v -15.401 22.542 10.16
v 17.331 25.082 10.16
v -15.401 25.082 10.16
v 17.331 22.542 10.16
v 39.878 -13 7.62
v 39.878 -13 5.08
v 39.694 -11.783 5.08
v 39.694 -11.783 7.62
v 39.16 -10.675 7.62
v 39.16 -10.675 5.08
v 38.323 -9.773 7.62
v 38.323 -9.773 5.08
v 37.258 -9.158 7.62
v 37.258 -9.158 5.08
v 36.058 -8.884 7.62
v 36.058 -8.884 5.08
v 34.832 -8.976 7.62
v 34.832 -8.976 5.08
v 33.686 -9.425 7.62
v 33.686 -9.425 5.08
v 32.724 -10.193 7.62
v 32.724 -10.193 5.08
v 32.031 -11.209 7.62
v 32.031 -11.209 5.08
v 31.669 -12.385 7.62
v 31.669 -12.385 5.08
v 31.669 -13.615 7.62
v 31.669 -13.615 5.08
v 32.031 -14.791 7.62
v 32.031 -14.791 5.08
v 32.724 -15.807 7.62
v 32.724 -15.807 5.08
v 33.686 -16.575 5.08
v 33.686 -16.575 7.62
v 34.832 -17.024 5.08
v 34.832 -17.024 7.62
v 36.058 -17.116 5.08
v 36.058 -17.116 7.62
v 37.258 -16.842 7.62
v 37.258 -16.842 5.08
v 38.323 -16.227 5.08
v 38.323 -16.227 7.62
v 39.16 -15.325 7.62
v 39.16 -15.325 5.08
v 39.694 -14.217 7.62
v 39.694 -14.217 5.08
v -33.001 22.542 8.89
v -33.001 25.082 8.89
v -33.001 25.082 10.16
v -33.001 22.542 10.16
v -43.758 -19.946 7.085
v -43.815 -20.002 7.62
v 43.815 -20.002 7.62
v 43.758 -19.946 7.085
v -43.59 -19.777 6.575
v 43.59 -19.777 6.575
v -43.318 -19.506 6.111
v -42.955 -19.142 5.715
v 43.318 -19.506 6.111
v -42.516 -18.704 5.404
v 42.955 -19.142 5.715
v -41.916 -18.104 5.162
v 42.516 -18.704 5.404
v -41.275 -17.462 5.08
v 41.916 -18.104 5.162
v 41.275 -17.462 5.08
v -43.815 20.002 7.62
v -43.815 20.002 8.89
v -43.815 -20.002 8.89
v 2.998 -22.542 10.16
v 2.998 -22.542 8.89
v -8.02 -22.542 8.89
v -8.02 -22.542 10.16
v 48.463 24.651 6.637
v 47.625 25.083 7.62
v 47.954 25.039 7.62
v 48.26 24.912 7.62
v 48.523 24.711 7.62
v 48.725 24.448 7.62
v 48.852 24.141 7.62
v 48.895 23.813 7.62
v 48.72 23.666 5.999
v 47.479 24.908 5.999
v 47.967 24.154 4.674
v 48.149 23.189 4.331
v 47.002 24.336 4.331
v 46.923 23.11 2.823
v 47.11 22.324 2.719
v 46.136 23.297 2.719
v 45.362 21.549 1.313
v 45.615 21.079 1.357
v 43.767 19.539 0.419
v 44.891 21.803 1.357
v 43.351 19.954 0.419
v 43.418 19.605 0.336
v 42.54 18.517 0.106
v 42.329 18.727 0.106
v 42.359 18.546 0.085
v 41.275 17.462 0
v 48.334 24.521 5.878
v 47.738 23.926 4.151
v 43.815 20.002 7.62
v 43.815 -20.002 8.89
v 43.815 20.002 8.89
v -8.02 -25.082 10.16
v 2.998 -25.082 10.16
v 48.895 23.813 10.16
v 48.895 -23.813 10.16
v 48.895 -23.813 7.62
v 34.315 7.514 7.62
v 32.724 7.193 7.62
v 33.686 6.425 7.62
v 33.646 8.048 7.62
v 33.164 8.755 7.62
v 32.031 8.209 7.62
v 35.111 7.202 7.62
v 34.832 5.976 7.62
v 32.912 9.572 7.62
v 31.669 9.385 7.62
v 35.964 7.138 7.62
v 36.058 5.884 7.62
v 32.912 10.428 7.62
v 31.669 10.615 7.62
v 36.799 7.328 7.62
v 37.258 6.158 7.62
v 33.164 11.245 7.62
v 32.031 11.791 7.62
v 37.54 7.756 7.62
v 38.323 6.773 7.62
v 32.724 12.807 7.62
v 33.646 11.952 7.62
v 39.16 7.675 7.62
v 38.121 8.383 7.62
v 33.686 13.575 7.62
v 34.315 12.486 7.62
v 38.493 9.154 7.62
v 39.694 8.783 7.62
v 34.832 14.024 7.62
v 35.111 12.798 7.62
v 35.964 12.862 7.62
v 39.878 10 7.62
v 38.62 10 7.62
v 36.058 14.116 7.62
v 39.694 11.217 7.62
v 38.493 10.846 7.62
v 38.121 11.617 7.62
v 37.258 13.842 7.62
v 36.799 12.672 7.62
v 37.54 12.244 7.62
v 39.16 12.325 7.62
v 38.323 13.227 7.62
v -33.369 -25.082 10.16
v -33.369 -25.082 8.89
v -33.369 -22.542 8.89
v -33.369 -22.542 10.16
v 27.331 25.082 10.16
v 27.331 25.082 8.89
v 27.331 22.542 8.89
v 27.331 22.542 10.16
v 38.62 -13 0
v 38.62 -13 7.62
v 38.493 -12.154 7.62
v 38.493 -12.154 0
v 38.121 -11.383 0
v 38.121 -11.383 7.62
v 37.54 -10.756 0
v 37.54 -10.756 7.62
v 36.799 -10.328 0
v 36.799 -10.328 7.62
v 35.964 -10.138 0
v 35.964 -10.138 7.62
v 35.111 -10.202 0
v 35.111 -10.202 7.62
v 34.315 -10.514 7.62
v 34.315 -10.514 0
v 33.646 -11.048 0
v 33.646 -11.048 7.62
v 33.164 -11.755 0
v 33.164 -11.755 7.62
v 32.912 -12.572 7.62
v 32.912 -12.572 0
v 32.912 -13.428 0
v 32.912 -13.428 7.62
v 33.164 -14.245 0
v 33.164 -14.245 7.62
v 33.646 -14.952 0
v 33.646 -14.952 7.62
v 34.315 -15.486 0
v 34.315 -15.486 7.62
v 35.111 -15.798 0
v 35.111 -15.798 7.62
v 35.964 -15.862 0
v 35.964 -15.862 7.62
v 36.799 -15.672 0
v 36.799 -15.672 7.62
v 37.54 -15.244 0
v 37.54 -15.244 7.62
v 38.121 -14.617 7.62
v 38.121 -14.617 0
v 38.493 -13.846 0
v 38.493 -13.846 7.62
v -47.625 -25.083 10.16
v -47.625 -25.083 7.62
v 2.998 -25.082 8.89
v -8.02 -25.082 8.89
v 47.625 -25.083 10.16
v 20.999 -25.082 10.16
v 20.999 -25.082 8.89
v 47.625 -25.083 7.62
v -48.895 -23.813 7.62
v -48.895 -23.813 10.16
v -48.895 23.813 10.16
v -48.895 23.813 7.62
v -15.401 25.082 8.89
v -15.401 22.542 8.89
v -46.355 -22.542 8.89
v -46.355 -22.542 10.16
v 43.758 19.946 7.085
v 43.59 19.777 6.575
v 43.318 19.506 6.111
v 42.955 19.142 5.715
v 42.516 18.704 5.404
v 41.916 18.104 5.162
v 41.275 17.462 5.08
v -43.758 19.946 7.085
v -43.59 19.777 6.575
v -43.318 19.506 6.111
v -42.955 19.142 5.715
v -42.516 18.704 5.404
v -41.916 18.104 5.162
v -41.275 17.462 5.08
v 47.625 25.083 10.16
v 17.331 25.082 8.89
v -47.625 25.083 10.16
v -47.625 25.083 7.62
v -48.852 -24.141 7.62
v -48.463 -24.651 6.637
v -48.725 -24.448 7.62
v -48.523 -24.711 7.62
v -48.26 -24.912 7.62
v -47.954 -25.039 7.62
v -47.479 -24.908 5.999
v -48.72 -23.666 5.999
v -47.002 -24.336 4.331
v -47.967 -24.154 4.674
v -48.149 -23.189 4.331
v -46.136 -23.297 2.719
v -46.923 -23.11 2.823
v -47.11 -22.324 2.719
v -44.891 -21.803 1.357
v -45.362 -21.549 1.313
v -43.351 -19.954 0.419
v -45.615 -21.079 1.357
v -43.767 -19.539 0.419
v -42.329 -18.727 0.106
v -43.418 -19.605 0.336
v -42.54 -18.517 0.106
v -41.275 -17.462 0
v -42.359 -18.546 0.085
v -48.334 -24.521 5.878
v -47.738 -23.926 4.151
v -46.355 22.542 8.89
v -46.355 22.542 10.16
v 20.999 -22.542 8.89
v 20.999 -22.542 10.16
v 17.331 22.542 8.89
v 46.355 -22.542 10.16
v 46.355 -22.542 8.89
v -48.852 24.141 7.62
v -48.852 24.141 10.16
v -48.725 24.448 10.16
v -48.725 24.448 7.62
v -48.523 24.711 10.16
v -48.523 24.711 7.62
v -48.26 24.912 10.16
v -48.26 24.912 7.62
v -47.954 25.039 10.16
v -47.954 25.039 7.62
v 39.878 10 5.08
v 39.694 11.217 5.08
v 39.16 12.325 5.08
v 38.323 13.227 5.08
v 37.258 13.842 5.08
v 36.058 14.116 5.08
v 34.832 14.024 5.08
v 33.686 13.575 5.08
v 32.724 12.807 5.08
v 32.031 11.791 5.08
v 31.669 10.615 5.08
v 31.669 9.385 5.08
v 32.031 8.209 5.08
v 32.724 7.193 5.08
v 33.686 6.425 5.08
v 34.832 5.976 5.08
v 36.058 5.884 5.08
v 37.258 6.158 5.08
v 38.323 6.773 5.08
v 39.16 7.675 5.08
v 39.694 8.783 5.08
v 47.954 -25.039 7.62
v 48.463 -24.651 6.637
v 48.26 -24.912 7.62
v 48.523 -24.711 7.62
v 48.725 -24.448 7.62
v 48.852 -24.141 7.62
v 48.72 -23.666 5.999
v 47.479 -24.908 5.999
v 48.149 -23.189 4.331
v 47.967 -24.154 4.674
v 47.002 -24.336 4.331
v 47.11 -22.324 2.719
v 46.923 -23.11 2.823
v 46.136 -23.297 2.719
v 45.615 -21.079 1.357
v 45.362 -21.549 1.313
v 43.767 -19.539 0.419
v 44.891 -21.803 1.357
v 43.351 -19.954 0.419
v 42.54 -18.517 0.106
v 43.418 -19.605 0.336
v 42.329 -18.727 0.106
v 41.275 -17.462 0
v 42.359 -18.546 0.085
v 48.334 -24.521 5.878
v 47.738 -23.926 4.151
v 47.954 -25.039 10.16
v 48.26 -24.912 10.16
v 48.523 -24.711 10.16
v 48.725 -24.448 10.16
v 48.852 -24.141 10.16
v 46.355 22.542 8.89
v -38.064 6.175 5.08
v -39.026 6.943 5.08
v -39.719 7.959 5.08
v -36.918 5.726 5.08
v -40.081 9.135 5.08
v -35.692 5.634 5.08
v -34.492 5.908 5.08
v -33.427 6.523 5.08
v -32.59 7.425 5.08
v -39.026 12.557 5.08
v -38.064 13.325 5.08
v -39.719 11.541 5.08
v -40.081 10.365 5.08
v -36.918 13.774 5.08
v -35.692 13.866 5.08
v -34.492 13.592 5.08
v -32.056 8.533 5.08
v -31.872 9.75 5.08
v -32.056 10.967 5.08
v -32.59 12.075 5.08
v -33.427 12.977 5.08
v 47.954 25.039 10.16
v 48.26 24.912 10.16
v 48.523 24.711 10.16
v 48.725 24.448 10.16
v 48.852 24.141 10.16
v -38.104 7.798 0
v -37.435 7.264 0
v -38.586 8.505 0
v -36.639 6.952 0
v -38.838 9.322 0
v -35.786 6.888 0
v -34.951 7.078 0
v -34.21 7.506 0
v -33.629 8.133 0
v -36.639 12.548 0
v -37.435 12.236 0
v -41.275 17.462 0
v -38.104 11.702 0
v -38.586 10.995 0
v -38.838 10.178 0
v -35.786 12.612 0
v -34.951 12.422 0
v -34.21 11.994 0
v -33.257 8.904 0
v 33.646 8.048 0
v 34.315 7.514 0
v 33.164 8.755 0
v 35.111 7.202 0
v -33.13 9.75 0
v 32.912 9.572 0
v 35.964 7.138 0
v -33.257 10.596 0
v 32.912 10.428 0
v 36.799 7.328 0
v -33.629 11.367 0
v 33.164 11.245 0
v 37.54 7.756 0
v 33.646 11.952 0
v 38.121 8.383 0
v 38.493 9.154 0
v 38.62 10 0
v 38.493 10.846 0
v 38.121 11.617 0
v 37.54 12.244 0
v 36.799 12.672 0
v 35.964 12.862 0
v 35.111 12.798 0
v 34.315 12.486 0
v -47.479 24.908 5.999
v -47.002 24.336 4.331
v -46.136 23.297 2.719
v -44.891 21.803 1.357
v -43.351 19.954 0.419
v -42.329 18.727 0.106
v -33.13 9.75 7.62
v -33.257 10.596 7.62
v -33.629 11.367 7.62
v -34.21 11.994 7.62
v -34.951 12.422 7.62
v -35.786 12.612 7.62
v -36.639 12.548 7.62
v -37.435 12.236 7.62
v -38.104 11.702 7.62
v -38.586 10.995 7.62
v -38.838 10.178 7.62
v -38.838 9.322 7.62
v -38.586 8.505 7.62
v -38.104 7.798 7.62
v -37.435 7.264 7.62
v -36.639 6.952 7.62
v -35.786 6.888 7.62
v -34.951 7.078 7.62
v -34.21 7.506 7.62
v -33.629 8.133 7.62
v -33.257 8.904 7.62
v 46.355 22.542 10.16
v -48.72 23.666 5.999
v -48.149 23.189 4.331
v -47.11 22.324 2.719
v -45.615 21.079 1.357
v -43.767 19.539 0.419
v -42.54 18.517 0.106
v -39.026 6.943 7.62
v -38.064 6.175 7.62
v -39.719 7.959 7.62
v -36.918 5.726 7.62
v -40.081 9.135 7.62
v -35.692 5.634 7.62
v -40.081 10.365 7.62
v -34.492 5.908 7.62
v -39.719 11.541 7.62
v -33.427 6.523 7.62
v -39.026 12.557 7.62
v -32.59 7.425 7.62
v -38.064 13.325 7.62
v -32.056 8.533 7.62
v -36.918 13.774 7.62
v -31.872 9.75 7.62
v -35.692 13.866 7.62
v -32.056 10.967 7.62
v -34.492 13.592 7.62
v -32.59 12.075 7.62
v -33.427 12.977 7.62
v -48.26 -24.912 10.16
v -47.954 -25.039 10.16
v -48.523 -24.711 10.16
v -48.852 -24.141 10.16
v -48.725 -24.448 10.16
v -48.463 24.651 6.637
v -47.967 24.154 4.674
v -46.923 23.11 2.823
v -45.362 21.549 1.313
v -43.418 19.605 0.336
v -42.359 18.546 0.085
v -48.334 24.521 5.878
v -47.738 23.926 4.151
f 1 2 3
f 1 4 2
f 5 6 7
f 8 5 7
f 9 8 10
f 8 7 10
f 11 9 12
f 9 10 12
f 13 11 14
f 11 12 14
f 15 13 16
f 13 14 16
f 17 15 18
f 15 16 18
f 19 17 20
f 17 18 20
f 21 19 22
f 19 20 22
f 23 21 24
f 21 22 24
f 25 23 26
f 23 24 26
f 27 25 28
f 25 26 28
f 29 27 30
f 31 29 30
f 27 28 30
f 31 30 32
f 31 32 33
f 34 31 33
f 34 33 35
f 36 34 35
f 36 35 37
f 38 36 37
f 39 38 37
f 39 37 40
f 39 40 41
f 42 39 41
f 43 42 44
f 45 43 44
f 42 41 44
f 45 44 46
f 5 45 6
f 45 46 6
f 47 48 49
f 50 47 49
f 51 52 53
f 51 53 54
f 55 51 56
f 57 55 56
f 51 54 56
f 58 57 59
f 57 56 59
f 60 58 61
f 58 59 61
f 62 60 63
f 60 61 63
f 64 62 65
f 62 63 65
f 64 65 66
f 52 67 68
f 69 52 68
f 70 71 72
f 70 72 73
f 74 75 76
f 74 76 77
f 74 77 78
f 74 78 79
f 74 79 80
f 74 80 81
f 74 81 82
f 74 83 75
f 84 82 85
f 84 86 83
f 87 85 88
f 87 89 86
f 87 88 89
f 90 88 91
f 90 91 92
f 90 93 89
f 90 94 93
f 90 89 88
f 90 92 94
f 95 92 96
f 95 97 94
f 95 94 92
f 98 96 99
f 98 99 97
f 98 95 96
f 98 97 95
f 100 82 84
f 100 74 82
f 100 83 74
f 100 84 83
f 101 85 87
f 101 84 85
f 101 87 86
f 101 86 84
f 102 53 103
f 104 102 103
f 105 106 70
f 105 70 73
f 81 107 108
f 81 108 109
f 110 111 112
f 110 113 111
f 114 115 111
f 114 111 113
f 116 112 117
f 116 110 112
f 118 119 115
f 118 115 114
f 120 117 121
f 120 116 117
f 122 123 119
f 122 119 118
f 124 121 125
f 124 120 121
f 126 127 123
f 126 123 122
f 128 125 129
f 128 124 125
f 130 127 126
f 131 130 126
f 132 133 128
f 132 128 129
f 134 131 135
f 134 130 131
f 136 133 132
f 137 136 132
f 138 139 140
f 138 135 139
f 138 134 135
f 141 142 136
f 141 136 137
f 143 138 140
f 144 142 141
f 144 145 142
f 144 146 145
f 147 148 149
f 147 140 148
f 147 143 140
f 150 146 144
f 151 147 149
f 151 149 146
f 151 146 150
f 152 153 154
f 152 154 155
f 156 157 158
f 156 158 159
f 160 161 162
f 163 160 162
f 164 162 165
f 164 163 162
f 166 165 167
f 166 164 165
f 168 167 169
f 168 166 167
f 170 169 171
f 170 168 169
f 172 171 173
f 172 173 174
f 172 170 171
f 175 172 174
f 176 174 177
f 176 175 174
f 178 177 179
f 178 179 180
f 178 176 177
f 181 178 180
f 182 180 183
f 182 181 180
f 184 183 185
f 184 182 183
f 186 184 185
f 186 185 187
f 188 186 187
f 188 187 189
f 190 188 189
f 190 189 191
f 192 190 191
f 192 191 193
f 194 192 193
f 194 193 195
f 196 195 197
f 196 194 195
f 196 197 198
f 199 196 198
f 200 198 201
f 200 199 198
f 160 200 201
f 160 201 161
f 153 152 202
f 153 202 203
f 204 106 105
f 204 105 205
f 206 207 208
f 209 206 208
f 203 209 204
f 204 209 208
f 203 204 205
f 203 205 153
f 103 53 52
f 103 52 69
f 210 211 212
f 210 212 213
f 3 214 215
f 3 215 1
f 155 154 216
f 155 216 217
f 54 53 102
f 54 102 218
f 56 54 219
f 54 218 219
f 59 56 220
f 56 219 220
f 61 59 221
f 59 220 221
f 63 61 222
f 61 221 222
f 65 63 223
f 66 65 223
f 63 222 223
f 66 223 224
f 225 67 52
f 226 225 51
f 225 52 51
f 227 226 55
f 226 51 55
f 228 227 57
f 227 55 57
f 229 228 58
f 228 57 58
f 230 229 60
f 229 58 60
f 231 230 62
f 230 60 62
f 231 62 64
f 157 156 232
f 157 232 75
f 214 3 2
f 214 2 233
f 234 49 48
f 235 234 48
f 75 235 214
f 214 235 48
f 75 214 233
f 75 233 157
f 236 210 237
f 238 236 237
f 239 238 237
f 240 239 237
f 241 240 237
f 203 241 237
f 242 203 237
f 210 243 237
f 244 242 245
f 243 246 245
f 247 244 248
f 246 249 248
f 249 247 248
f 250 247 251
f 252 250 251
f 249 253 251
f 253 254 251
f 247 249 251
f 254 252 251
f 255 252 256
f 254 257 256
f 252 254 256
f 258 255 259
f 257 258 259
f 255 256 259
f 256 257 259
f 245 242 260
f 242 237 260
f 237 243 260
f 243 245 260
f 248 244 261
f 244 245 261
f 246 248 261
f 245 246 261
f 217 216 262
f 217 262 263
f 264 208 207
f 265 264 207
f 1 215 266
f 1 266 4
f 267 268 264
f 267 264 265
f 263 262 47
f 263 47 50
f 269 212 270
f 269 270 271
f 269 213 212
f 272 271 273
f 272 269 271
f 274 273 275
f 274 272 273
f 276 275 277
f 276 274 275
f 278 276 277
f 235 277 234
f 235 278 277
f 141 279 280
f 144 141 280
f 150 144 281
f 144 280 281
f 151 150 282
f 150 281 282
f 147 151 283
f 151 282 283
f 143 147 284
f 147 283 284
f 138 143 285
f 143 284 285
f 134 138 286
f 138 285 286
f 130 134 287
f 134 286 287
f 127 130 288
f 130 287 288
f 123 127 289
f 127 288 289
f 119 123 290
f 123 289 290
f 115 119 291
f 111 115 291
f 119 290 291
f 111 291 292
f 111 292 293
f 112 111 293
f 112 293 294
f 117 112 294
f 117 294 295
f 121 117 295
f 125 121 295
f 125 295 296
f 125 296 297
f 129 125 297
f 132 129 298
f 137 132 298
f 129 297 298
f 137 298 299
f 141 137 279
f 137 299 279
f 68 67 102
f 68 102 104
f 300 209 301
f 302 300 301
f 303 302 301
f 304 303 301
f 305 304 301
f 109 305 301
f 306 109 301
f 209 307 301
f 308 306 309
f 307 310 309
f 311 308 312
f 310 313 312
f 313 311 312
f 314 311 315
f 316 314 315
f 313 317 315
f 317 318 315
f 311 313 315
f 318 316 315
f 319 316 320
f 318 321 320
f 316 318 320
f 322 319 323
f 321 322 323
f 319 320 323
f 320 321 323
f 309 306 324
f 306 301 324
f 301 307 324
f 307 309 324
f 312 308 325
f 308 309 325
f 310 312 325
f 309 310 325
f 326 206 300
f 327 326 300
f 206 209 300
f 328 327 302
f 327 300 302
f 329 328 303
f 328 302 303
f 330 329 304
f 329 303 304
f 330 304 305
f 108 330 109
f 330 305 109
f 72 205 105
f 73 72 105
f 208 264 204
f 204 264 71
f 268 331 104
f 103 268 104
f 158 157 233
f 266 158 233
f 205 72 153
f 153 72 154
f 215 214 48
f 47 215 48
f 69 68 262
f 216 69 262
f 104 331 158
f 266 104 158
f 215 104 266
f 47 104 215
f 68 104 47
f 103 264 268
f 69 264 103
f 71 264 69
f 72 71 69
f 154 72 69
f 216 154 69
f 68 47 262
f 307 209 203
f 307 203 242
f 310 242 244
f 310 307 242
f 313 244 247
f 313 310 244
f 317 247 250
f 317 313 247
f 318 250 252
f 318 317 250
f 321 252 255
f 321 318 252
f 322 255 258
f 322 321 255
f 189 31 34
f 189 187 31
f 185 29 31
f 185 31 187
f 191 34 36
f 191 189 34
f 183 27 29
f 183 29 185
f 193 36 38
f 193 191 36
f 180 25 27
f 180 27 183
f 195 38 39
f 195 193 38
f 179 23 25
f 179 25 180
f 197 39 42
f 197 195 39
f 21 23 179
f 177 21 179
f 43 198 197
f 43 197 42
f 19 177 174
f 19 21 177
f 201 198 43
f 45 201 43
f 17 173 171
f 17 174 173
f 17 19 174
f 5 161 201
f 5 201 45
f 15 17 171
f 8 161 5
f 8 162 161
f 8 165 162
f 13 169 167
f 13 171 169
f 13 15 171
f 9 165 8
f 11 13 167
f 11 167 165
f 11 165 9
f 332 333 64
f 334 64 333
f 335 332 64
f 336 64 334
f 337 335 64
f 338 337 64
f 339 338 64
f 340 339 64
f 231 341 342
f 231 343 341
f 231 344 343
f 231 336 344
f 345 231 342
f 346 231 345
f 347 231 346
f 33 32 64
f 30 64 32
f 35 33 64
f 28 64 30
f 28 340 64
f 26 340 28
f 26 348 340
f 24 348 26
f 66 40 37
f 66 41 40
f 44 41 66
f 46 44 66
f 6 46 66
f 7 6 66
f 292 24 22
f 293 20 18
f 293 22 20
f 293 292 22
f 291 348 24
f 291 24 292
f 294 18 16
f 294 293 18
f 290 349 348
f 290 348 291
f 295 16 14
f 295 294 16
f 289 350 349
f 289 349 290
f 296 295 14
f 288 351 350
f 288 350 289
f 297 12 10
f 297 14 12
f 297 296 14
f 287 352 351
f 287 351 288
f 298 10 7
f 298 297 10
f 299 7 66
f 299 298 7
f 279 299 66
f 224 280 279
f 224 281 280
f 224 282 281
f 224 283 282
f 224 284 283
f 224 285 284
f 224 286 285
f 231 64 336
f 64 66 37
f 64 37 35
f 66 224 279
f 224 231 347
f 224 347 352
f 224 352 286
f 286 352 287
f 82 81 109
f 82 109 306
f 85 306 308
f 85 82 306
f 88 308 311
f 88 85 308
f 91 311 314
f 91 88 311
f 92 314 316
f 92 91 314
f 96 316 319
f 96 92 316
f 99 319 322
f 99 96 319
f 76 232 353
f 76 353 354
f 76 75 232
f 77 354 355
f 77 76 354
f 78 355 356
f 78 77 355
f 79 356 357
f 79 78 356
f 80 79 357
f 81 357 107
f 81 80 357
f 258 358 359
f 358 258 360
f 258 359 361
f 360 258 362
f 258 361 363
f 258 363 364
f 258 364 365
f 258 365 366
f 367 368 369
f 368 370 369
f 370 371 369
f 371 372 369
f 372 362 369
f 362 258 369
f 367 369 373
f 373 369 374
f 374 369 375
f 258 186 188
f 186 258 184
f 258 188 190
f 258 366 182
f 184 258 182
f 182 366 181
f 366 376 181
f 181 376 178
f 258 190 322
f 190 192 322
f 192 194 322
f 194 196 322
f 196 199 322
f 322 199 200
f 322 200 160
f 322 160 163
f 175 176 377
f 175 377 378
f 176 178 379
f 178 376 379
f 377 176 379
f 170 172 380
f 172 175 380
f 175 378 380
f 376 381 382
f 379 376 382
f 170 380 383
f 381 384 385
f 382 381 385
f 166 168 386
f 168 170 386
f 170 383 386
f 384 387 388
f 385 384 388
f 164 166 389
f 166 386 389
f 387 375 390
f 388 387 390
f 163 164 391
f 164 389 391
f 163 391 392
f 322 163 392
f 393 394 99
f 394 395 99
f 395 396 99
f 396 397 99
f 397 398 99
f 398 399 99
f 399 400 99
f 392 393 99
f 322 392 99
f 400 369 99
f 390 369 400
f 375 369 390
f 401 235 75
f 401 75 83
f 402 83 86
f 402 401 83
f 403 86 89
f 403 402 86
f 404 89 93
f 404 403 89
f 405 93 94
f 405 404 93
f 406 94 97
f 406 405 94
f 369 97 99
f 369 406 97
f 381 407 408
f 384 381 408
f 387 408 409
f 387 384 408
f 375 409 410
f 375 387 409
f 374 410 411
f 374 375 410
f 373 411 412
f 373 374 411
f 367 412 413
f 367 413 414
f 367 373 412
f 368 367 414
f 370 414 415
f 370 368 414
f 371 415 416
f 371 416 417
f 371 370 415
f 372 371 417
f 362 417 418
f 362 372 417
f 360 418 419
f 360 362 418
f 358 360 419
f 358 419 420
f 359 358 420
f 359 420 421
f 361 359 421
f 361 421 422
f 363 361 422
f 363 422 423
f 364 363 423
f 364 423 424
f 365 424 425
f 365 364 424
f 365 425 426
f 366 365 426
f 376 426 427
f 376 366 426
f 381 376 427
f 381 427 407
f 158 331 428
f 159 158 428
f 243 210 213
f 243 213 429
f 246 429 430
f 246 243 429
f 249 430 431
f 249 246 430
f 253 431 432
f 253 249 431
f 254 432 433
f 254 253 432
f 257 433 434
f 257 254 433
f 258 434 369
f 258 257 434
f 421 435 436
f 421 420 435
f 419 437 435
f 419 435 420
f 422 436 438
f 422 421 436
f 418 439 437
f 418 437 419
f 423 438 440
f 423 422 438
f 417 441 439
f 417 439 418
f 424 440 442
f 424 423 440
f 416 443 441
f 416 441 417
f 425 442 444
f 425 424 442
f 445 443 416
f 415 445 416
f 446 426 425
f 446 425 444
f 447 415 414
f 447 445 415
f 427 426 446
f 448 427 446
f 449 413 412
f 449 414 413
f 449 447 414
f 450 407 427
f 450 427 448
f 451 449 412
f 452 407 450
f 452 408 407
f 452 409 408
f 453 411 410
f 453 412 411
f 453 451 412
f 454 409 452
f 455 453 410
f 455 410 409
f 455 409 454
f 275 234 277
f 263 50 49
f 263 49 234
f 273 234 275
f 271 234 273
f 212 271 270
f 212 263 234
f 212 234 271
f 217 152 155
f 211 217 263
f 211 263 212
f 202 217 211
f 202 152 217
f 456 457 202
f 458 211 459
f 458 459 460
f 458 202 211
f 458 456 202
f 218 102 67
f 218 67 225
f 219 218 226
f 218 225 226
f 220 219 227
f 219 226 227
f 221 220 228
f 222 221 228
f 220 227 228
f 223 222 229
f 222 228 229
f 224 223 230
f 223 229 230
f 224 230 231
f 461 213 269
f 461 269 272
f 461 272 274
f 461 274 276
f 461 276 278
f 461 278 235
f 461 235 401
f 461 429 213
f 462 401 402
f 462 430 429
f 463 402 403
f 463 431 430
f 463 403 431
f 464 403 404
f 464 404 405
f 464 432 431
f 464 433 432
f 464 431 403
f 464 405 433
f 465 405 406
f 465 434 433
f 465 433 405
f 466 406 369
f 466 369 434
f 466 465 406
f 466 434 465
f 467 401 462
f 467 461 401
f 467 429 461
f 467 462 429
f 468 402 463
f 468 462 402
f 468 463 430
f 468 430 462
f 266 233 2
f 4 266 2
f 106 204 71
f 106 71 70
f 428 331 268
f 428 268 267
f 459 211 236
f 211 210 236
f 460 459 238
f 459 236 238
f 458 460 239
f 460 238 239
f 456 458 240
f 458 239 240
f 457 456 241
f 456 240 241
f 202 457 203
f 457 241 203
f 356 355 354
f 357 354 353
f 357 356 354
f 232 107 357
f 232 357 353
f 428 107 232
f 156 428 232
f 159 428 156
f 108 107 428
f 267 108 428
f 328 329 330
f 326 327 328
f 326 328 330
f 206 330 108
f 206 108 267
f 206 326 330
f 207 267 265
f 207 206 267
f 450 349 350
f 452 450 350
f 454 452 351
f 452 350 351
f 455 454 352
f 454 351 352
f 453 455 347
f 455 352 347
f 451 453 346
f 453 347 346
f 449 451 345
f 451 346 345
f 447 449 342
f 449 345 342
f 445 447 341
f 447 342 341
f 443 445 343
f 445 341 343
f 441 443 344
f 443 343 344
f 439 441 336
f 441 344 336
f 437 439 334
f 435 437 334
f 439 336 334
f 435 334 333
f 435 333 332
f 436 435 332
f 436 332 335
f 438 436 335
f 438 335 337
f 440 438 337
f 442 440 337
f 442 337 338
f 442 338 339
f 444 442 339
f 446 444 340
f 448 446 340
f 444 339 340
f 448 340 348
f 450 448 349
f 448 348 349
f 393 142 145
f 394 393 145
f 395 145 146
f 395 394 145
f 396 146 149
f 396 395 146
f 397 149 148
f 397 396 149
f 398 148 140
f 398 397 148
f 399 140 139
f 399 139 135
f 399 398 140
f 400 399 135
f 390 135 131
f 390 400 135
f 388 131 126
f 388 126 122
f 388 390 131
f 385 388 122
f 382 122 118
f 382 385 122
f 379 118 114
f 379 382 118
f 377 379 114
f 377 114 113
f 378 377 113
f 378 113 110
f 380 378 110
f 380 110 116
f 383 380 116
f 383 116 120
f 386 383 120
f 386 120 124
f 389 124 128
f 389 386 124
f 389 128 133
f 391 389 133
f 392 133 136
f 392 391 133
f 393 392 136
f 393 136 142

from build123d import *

# Parameters (mm, degrees)
F0_W      = 82.55
F0_H      = 34.925
F0_R      = 2.8702
F1_DEPTH  = 5.08
F4_R      = 1.27
F5_W      = 17.59966
F5_H      = 1.27
F5_W_2    = 9.99998
F6_DEPTH  = 3.556
F7_R      = 4.1275
F7_R_2    = 2.8702
F8_DEPTH  = 2.54
F9_W      = 18.00098
F9_H      = 1.27
F9_W_2    = 25.3492
F10_DEPTH = 5.08


with BuildPart() as f1:
    # F0 (on Top) → F1 (new body)
    with BuildSketch(Plane.XY):
        Rectangle(F0_W, F0_H)
        with Locations((35.75, -13)):
            Circle(F0_R, mode=Mode.SUBTRACT)
        with Locations((-36, 9.75)):
            Circle(F0_R, mode=Mode.SUBTRACT)
        with Locations((35.75, 10)):
            Circle(F0_R, mode=Mode.SUBTRACT)
    extrude(amount=F1_DEPTH)

    # F3: sweep along a path in F3_path
    with BuildLine(Plane(origin=(-41.275, 17.4625, 5.08), x_dir=(0, -1, 0), z_dir=(0, 0, -1))) as f3_path:
        Line((0, 0), (34.925, 0))
        Line((34.925, 0), (34.925, -82.55))
        Line((34.925, -82.55), (0, -82.55))
        Line((0, -82.55), (0, 0))
    # F2 (on Front) → F3 (sweep)
    with BuildSketch(Plane.XZ):
        with BuildLine():
            Line((-41.275, 0), (-41.275, 5.08))
            ThreePointArc((-41.275, 5.08), (-43.0710512242, 5.8239487758), (-43.815, 7.62))
            Line((-43.815, 7.62), (-43.815, 8.89))
            Line((-43.815, 8.89), (-46.355, 8.89))
            Line((-46.355, 8.89), (-46.355, 10.16))
            Line((-46.355, 10.16), (-48.895, 10.16))
            Line((-48.895, 10.16), (-48.895, 7.62))
            ThreePointArc((-48.895, 7.62), (-46.6631536726, 2.2318463274), (-41.275, 0))
        make_face()
    sweep(path=f3_path.line, transition=Transition.RIGHT)

    # F4
    f4_edges = [f1.edges().sort_by_distance(p)[0] for p in [
        (46.663154, 22.850654, 2.231846),
        (-46.663154, 22.850654, 2.231846),
        (-46.663154, -22.850654, 2.231846),
        (46.663154, -22.850654, 2.231846),
        (48.895, 25.0825, 8.89),
        (-48.895, 25.0825, 8.89),
        (-48.895, -25.0825, 8.89),
        (48.895, -25.0825, 8.89),
    ]]
    fillet(f4_edges, radius=F4_R)

    # F5 (on face) → F6 (cut)
    with BuildSketch(Plane(origin=(0, 25.0825, 0), x_dir=(-1, 0, 0), z_dir=(0, 1, 0))):
        with Locations((24.20069, 9.525)):
            Rectangle(F5_W, F5_H)
        with Locations((-22.33125, 9.525)):
            Rectangle(F5_W_2, F5_H)
    extrude(amount=-F6_DEPTH, mode=Mode.SUBTRACT)

    # F7 (on face) → F8 (join)
    with BuildSketch(Plane.XY.offset(5.08)):
        with Locations((-36, 9.75)):
            Circle(F7_R)
        with Locations((-36, 9.75)):
            Circle(F7_R_2, mode=Mode.SUBTRACT)
        with Locations((35.75, 10)):
            Circle(F7_R)
        with Locations((35.75, 10)):
            Circle(F7_R_2, mode=Mode.SUBTRACT)
        with Locations((35.75, -13)):
            Circle(F7_R)
        with Locations((35.75, -13)):
            Circle(F7_R_2, mode=Mode.SUBTRACT)
    extrude(amount=F8_DEPTH)

    # F9 (on face) → F10 (cut)
    with BuildSketch(Plane.XZ.offset(25.0825)):
        with Locations((11.99853, 9.525)):
            Rectangle(F9_W, F9_H)
        with Locations((-20.69422, 9.525)):
            Rectangle(F9_W_2, F9_H)
    extrude(amount=-F10_DEPTH, mode=Mode.SUBTRACT)


solid = f1.part
